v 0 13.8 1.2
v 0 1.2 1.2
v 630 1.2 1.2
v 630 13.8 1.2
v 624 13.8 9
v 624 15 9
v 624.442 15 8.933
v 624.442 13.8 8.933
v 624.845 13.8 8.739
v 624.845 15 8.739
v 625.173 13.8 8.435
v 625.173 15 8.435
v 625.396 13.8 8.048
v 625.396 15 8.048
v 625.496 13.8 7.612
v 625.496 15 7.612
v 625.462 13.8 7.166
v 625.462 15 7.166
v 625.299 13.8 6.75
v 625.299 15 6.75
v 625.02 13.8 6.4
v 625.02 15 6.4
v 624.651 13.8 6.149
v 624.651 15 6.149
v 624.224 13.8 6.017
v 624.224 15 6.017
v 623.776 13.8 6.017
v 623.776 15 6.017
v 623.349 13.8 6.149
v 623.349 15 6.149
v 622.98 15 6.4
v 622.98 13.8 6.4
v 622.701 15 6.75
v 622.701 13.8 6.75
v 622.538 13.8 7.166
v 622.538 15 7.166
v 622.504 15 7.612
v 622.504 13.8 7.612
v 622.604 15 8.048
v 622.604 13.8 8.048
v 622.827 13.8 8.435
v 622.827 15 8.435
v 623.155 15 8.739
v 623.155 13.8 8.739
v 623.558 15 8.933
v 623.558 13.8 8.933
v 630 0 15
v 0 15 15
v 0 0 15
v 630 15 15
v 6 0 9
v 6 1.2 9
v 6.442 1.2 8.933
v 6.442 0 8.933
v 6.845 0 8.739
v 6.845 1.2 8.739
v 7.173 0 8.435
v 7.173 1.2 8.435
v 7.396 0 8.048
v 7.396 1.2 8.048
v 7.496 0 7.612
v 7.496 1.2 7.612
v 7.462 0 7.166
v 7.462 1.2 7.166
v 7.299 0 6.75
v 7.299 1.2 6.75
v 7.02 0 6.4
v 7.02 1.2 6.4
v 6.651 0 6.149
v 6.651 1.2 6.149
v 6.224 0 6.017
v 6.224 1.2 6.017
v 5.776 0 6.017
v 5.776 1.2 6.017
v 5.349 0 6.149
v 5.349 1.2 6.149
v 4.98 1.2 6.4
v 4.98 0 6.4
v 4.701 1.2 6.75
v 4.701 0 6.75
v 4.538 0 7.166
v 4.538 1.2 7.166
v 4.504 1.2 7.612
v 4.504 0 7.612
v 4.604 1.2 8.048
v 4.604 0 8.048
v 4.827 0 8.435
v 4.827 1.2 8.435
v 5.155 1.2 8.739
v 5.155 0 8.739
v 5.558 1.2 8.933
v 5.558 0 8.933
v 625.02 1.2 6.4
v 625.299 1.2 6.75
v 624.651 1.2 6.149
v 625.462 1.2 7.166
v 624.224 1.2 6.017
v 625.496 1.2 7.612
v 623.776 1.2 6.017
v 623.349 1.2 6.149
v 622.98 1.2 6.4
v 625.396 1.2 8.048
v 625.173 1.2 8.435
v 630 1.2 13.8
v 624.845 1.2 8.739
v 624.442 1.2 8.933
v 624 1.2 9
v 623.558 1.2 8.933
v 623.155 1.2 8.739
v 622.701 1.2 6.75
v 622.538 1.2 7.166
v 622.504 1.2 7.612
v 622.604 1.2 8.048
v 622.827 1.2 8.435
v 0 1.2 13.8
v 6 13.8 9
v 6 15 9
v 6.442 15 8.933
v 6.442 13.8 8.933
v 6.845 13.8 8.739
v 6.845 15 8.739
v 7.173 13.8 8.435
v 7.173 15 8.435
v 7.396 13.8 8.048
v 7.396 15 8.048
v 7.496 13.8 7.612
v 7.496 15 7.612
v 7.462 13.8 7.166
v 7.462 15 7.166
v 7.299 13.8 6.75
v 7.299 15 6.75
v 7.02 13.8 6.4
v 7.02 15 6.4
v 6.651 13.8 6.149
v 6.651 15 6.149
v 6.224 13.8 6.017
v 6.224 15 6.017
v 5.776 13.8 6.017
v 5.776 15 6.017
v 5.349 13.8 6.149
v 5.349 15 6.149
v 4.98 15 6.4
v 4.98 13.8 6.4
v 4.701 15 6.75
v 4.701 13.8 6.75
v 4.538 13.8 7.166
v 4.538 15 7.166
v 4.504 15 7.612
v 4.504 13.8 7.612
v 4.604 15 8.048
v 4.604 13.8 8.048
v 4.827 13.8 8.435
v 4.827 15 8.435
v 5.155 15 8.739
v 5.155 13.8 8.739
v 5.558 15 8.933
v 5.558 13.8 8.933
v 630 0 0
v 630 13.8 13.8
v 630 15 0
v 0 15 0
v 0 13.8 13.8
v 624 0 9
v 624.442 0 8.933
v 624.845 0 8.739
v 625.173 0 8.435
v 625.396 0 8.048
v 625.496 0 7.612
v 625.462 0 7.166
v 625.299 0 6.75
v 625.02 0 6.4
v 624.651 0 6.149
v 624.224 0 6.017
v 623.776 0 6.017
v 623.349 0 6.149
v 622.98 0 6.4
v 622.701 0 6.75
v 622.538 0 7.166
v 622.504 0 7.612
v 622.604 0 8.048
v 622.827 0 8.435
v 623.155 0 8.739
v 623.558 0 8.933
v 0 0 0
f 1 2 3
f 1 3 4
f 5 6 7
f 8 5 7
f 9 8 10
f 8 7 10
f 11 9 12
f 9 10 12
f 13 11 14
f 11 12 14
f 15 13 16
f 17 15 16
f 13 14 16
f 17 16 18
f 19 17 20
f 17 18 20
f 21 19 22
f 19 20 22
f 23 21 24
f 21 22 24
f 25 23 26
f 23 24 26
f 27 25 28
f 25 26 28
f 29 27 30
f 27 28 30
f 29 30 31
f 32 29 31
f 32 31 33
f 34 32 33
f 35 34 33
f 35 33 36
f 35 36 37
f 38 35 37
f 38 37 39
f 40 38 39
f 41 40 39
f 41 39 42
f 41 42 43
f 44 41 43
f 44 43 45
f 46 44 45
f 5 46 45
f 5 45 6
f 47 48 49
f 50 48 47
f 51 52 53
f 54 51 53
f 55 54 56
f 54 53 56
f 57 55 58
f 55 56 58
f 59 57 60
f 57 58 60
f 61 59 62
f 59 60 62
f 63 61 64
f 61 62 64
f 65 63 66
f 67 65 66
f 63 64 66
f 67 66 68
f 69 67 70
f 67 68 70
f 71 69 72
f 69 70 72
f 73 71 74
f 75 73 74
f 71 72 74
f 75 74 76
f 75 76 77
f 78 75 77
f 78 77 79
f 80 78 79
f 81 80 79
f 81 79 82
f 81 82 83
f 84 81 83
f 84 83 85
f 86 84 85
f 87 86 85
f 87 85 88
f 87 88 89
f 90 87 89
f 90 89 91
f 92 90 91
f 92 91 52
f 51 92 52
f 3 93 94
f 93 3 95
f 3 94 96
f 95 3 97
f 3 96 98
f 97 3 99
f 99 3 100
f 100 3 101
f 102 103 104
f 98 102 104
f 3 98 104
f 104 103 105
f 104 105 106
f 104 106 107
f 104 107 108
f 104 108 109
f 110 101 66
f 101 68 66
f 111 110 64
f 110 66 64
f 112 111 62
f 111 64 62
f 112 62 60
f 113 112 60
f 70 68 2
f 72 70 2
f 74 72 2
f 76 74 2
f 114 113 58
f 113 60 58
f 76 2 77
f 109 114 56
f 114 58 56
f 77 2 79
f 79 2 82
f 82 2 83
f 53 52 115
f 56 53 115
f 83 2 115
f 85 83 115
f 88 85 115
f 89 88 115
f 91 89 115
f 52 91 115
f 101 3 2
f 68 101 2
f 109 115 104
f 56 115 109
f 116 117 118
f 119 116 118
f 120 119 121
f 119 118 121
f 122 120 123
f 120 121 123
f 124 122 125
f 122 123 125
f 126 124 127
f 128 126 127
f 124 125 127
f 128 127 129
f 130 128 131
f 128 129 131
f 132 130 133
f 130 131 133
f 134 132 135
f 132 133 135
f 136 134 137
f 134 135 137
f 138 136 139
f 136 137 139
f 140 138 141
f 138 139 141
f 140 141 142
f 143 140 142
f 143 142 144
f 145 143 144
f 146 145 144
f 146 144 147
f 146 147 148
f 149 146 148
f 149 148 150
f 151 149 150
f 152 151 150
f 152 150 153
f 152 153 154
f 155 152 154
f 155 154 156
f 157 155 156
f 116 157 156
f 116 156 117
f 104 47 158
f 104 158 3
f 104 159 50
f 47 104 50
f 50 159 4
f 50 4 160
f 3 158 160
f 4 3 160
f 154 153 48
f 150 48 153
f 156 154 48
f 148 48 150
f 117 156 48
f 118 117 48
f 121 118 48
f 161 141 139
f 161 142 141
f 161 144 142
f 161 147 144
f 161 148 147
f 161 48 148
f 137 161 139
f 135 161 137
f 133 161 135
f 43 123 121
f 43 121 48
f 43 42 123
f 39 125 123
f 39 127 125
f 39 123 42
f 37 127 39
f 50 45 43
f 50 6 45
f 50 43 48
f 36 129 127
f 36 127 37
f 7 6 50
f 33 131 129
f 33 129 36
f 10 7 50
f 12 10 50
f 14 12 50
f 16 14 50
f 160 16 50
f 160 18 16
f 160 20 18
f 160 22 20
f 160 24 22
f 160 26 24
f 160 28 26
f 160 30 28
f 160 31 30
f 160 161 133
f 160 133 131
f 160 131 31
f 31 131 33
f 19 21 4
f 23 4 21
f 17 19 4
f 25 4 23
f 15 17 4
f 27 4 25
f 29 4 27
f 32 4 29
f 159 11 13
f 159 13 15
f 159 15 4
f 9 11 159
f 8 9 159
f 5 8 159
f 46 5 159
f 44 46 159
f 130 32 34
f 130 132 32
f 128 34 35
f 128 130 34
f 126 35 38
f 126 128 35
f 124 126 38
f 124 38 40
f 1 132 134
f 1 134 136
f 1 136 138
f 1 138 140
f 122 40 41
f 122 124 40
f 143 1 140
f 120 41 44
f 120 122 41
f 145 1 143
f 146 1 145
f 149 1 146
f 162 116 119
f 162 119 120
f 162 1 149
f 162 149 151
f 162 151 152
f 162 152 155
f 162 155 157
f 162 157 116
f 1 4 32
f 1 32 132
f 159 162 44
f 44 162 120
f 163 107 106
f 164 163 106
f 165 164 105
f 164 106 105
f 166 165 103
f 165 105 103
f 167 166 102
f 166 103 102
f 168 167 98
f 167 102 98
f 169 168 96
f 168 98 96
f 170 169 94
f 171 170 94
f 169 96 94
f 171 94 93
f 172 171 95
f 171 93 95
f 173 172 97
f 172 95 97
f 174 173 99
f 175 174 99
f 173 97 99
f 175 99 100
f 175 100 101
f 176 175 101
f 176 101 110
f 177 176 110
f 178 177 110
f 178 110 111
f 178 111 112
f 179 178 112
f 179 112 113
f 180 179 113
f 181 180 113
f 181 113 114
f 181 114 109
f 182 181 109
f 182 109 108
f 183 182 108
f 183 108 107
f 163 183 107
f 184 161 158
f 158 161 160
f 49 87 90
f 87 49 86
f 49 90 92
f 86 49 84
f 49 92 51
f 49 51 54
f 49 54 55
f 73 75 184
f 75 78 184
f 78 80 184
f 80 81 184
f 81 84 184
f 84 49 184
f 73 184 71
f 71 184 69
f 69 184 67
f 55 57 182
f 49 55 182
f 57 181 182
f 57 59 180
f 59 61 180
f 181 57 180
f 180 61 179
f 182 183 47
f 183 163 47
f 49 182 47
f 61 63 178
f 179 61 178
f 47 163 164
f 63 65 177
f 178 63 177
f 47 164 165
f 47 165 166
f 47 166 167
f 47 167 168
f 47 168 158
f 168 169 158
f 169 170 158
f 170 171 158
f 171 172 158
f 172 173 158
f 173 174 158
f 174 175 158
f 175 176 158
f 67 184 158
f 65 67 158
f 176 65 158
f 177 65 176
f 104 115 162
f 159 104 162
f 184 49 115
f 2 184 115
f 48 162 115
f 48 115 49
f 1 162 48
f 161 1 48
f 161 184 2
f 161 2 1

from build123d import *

# Parameters (mm, degrees)
SKETCH_1_W          = 630
SKETCH_1_H          = 15
EXTRUDE_1_DEPTH     = 15
SKETCH_2_R          = 1.5
CUT_EXTRUDE_1_DEPTH = 631.357041684
SKETCH_3_W          = 12.6
SKETCH_3_H          = 12.6
CUT_EXTRUDE_2_DEPTH = 631.357041684


with BuildPart() as part:
    # ｽｹｯﾁ1 → ﾎﾞｽ - 押し出し1 (new body)
    with BuildSketch(Plane.XY):
        with Locations((315, 7.5)):
            Rectangle(SKETCH_1_W, SKETCH_1_H)
    extrude(amount=EXTRUDE_1_DEPTH)

    # ｽｹｯﾁ2 → ｶｯﾄ - 押し出し1 (cut, through all)
    with BuildSketch(Plane(origin=(0, 15, 0), x_dir=(1, 0, 0), z_dir=(0, 1, 0))):
        with Locations(Location((6, -7.5, 0), (0, 0, 270))):
            Circle(SKETCH_2_R)
        with Locations(Location((624, -7.5, 0), (0, 0, 270))):
            Circle(SKETCH_2_R)
    extrude(amount=-CUT_EXTRUDE_1_DEPTH, mode=Mode.SUBTRACT)

    # ｽｹｯﾁ3 → ｶｯﾄ - 押し出し2 (cut, through all)
    with BuildSketch(Plane.ZY):
        with Locations((7.5, 7.5)):
            Rectangle(SKETCH_3_W, SKETCH_3_H)
    extrude(amount=-CUT_EXTRUDE_2_DEPTH, mode=Mode.SUBTRACT)


solid = part.part
